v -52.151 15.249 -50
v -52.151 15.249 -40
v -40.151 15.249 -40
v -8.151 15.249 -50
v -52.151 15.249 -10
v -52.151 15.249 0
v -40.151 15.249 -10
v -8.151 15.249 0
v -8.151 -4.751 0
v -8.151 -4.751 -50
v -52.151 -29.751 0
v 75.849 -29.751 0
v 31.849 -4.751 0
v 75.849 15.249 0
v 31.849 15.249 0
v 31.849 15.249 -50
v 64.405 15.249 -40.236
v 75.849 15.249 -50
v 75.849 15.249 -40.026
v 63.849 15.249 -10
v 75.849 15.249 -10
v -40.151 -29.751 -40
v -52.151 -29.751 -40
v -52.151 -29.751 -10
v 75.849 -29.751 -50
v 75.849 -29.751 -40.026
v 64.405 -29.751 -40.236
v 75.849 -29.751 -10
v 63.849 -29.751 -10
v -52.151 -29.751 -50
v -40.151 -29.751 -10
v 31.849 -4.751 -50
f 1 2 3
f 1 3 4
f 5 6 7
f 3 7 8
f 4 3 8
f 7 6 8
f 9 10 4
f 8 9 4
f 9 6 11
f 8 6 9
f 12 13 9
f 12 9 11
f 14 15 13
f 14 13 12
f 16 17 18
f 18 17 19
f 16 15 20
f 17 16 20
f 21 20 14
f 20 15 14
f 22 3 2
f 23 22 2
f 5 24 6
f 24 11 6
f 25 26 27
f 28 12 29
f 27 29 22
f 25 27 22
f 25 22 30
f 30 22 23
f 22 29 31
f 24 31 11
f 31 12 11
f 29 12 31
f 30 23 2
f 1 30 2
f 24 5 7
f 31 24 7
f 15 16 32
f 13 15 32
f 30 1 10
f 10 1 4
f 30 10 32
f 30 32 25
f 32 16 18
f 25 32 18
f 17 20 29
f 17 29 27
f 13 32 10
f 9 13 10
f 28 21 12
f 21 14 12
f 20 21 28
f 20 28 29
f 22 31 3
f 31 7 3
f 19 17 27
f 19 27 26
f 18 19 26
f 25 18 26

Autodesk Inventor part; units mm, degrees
ref_plane "YZ Plane" through (0, 0, 0) normal (1, 0, 0) x (0, 1, 0)
ref_plane "XZ Plane" through (0, 0, 0) normal (0, 1, 0) x (-1, 0, 0)
ref_plane "XY Plane" through (0, 0, 0) normal (0, 0, 1) x (1, 0, 0)
sketch "Sketch1" plane through (0, 0, 0) normal (0, 0, 1) x (1, 0, 0)
  line L0 (-52.1514, 15.2486) -> (75.8486, 15.2486)
  line L1 (75.8486, 15.2486) -> (75.8486, -29.7514)
  line L2 (75.8486, -29.7514) -> (-52.1514, -29.7514)
  line L3 (-52.1514, -29.7514) -> (-52.1514, 15.2486)
  point P0 (0, 0)
  dimension "d0" = 128
  dimension "d1" = 128
  dimension "d2" = 45
extrude "Extrusion1" add sketch "Sketch1" against normal blind 50
ref_plane "Work Plane1" through (0, 0, -50) normal (0, 0, -1) x (-1, 0, 0)
sketch "Sketch2" plane through (0, 0, -50) normal (0, 0, -1) x (-1, 0, 0)
  line L0 (52.1514, 15.2486) -> (-75.8486, 15.2486) projected
  line L1 (-31.8486, 15.2486) -> (-31.8486, -4.7514)
  line L2 (-31.8486, -4.7514) -> (8.1514, -4.7514)
  line L3 (8.1514, -4.7514) -> (8.1514, 15.2486)
  point P0 (0, 0)
  dimension "d6" = 44
  dimension "d7" = 44
  dimension "d8" = 20
extrude "Extrusion2" cut sketch "Sketch2" against normal blind 50
sketch "Sketch3" plane through (75.8486, -29.7514, 0) normal (1, 0, 0) x (0, 0, -1)
  line L0 (0, 45) -> (50, 45) projected
  line L1 (10, 45) -> (10, 29.7514)
  point P0 (0, 29.7514)
  point P1 (40, 45)
  dimension "d11" = 10
  dimension "d12" = 10
sketch "Sketch4" plane through (75.8486, 15.2486, 0) normal (0, 1, 0) x (1, 0, 0)
  line L0 (0, 0) -> (0, 50) projected
  line L1 (0, 50) -> (-128, 50) projected
  line L2 (0, 10) -> (-12, 10)
  line L3 (-12, 10) -> (-11.4432, 40.2365)
  line L4 (-11.4432, 40.2365) -> (0.5568, 40.0155)
  point P0 (-75.8486, 0)
  point P1 (0, 40.0258)
  dimension "d13" = 10
  dimension "d14" = 10
  dimension "d15" = 12
  dimension "d16" = 12
extrude "Extrusion3" cut sketch "Sketch4" against normal blind 50
sketch "Sketch5" plane through (31.8486, 15.2486, 0) normal (0, 1, 0) x (1, 0, 0)
  line L0 (-84, 0) -> (-84, 50) projected
  line L1 (44, 50) -> (-84, 50) projected
  line L2 (-84, 10) -> (-72, 10)
  line L3 (-72, 10) -> (-72, 40)
  line L4 (-72, 40) -> (-84, 40)
  point P0 (-31.8486, 0)
  dimension "d19" = 10
  dimension "d20" = 10
  dimension "d21" = 12
  dimension "d22" = 12
extrude "Extrusion4" cut sketch "Sketch5" against normal blind 50
